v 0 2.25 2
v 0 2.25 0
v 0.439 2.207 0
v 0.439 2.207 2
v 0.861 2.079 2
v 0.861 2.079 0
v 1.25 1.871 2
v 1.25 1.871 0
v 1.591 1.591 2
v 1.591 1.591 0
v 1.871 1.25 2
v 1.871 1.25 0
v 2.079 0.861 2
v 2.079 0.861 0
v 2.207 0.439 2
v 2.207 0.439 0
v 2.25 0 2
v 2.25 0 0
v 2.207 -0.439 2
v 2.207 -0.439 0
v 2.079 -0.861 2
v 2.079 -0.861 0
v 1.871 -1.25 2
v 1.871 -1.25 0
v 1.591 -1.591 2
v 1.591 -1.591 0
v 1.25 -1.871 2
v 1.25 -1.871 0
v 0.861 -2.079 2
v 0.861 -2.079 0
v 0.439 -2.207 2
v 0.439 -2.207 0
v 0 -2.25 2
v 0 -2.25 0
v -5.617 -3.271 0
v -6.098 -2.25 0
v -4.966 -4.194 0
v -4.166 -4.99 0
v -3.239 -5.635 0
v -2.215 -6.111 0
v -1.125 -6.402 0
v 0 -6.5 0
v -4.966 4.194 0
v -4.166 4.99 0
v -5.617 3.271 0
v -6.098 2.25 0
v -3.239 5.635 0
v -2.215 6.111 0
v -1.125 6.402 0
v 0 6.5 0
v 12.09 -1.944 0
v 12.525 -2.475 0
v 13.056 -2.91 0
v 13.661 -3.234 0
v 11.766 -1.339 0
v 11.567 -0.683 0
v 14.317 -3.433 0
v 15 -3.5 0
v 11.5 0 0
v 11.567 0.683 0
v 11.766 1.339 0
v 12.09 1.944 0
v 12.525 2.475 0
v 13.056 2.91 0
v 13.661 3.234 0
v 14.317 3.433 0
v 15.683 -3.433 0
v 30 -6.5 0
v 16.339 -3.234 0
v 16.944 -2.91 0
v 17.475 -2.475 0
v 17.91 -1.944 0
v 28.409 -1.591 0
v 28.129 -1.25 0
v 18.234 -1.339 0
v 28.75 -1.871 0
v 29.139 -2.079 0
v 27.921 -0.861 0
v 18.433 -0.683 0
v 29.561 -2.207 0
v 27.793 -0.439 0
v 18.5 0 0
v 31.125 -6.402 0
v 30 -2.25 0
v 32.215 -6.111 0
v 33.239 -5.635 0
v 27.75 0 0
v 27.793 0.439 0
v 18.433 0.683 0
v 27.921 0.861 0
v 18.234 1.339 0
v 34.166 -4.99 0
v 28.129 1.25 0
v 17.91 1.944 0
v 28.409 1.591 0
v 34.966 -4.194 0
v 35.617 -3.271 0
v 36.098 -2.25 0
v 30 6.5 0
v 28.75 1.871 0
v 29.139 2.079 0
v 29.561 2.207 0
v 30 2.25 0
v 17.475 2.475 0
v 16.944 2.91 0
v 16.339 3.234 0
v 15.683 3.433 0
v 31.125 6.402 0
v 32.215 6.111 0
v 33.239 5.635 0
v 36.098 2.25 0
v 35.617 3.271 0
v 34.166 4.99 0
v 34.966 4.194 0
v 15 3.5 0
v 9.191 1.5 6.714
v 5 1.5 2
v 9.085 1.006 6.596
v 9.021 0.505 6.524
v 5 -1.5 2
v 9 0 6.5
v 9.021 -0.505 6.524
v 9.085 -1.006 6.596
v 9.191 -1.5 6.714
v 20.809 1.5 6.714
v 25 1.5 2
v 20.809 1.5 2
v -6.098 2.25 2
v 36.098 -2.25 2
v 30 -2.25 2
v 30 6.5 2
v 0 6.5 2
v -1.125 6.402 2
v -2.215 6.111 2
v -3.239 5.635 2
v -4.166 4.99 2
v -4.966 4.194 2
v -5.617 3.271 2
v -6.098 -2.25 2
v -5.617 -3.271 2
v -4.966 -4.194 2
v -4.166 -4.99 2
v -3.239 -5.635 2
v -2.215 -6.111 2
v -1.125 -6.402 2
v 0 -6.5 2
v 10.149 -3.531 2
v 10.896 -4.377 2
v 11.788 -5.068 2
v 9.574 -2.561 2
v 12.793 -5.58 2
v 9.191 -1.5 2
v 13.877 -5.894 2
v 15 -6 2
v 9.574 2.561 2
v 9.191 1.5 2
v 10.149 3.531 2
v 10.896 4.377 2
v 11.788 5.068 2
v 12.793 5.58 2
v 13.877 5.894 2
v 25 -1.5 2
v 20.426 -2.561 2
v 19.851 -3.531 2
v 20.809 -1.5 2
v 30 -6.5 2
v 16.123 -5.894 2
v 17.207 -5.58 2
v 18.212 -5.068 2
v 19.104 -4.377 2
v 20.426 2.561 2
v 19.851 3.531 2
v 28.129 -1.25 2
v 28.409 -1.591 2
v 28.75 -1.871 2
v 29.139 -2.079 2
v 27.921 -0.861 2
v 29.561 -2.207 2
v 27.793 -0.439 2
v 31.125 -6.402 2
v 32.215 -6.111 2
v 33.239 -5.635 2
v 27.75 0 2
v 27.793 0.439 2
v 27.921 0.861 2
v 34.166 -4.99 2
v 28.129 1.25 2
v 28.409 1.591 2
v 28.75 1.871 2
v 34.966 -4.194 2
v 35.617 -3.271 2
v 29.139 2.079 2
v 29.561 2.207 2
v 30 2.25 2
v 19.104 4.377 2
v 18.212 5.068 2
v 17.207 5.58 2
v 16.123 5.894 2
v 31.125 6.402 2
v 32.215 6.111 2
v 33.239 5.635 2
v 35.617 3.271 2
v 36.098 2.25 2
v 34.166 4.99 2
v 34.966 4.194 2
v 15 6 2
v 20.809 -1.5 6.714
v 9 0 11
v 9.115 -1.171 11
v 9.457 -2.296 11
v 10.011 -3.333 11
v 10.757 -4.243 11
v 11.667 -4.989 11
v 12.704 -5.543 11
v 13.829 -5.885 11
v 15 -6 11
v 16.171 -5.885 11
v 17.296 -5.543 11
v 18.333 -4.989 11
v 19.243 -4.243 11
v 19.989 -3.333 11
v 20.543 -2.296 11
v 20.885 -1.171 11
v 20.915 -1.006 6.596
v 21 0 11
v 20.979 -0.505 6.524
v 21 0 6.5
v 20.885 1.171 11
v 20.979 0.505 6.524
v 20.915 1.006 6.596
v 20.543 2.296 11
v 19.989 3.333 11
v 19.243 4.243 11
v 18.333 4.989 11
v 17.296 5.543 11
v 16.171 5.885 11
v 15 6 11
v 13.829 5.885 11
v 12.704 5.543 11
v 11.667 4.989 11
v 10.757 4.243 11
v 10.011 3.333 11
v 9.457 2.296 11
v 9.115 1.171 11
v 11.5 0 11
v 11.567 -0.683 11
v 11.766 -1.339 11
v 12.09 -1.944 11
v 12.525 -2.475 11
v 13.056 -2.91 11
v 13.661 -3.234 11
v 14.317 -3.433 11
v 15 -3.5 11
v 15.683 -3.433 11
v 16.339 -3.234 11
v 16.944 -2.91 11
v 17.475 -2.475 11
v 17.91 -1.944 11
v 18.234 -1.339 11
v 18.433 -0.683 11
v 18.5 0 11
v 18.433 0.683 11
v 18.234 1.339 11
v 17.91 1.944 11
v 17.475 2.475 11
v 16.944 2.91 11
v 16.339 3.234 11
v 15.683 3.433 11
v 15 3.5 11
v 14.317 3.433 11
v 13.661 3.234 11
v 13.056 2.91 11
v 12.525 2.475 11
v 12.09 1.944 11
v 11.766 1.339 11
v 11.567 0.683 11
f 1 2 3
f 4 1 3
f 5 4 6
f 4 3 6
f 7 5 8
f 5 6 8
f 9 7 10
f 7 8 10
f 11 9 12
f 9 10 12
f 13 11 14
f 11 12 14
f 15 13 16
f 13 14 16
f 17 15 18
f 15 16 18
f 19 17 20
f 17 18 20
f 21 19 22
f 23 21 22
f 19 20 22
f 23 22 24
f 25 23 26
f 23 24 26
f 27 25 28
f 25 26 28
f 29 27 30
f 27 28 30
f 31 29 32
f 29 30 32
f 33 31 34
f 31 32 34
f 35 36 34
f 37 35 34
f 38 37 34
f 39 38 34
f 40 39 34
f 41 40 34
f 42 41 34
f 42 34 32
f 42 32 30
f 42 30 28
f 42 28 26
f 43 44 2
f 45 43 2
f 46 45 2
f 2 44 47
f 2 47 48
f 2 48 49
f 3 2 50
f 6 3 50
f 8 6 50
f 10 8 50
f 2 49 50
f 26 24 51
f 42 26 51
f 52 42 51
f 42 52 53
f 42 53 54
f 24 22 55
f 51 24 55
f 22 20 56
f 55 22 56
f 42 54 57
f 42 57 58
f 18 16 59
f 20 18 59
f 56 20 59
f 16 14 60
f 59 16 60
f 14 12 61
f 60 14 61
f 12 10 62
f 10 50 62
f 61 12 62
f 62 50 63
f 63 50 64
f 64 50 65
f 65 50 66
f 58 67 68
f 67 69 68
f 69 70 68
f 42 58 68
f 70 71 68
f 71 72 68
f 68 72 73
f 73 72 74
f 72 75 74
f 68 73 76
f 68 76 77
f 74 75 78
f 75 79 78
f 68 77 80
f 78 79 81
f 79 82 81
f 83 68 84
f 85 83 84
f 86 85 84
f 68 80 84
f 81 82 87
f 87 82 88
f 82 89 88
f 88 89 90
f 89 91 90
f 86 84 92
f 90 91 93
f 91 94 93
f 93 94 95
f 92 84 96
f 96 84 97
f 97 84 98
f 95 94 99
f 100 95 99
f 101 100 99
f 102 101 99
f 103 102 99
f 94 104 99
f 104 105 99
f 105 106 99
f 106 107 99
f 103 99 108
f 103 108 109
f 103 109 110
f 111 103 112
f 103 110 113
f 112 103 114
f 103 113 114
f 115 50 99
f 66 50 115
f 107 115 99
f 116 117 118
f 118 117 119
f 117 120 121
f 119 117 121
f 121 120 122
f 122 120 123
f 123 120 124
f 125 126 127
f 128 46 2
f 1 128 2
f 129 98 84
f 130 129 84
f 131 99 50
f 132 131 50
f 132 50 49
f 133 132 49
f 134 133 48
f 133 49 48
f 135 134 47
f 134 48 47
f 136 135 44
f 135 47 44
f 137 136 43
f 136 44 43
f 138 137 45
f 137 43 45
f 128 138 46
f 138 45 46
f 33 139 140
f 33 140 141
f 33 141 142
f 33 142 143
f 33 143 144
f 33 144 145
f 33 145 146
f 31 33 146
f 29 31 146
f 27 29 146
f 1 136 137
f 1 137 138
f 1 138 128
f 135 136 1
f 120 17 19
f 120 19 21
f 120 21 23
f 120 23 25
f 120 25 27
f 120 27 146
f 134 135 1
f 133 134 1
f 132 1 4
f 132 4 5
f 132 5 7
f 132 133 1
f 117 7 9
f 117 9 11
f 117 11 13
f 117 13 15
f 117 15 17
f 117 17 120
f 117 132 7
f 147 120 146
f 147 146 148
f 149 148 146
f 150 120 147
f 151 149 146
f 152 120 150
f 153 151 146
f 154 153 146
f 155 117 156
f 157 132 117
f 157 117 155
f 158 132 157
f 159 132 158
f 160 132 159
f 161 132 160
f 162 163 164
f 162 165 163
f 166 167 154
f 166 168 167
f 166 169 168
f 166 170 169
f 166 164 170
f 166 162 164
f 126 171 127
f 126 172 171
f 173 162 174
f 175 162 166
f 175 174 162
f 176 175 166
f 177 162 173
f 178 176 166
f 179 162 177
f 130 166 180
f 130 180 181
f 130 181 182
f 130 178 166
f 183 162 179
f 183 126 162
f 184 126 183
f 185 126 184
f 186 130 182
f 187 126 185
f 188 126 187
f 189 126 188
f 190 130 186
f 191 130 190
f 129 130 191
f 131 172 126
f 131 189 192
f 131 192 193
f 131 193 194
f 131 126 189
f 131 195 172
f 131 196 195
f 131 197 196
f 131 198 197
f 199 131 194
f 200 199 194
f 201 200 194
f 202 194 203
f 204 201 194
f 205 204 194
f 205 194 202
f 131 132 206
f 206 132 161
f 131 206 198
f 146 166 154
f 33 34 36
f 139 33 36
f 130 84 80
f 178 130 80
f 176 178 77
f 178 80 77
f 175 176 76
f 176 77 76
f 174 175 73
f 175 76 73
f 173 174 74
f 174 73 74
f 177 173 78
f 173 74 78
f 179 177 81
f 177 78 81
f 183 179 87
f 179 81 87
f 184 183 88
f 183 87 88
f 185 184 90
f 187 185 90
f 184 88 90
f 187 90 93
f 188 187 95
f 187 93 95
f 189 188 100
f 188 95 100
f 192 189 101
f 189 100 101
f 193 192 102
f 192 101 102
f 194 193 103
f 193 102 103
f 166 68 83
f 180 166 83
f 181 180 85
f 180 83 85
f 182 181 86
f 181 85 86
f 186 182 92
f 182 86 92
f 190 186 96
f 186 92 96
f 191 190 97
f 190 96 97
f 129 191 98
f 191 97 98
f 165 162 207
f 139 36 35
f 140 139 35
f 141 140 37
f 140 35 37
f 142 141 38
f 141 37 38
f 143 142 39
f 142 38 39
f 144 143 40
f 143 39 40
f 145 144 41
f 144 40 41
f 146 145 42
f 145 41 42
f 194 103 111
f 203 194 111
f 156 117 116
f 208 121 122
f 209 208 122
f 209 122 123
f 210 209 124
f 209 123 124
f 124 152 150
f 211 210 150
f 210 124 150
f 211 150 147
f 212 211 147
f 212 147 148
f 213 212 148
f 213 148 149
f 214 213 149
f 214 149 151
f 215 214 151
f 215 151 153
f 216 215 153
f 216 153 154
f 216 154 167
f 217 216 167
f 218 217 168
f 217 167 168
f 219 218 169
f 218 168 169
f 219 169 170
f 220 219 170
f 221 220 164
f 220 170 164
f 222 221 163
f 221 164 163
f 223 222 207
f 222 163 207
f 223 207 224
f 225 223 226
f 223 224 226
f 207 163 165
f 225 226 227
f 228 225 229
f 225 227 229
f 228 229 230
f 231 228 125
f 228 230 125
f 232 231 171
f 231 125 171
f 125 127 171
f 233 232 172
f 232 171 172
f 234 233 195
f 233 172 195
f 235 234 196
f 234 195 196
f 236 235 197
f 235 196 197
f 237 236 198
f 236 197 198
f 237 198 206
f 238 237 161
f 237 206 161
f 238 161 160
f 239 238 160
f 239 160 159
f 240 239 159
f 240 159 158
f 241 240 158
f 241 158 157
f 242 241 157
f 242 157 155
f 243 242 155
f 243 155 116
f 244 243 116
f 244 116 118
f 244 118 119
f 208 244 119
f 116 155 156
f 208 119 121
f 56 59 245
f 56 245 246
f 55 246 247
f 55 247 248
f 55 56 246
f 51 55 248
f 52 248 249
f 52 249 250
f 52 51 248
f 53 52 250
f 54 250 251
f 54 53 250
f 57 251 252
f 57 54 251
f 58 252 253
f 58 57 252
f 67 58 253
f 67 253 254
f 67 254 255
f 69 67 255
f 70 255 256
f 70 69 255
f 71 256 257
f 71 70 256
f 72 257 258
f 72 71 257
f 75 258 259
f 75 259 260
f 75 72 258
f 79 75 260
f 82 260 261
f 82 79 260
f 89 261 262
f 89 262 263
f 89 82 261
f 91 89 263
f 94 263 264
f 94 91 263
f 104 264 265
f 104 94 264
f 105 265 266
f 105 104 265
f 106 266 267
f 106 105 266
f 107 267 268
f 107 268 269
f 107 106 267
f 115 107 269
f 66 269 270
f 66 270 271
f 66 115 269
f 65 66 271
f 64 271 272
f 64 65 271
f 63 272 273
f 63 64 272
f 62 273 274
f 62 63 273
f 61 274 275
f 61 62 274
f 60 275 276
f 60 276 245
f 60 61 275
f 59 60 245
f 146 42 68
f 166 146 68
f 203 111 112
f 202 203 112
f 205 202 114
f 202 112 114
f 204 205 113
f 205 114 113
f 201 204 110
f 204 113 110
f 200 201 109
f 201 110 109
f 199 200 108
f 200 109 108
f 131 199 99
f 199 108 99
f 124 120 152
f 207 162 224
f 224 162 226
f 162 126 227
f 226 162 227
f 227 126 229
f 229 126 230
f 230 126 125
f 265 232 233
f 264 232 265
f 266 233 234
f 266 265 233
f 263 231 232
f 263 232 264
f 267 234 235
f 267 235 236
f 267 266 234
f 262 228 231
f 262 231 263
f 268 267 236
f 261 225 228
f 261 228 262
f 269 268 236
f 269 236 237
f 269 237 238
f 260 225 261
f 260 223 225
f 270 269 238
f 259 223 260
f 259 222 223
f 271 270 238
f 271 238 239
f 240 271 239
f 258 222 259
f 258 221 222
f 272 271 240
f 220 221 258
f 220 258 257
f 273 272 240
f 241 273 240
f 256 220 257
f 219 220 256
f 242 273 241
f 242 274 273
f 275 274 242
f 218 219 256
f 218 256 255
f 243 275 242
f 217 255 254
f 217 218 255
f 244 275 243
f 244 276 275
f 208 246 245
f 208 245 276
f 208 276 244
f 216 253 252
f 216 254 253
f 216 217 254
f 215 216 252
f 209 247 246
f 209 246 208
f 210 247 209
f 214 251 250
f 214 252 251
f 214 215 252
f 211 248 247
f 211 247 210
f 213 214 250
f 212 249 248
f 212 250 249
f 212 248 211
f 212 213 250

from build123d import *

# Parameters (mm, degrees)
SKETCH_1_R               = 6
EXTRUDE_1_DEPTH          = 2
SKETCH_1_3_R             = 6
SKETCH_1_3_R_2           = 3.5
EXTRUDE_2_DEPTH          = 11
RIB_1_REACH              = 40.293
SKETCH_2_WALL_W          = 84.606091636
SKETCH_2_WALL_H          = 3
PATTERN_CIRCULAR_1_COUNT = 2


with BuildPart() as part:
    # Эскиз1 → Бобышка-Вытянуть1 (new body)
    with BuildSketch(Plane.XY):
        with BuildLine():
            Line((30, 6.5), (0, 6.5))
            ThreePointArc((0, 6.5), (-3.716517187, 5.332682252), (-6.098155459, 2.25))
            Line((-6.098155459, 2.25), (0, 2.25))
            ThreePointArc((0, 2.25), (2.25, 0), (0, -2.25))
            Line((0, -2.25), (-6.098155459, -2.25))
            ThreePointArc((-6.098155459, -2.25), (-3.716517187, -5.332682252), (0, -6.5))
            Line((0, -6.5), (30, -6.5))
            ThreePointArc((30, -6.5), (33.716517187, -5.332682252), (36.098155459, -2.25))
            Line((36.098155459, -2.25), (30, -2.25))
            ThreePointArc((30, -2.25), (27.75, 0), (30, 2.25))
            Line((30, 2.25), (36.098155459, 2.25))
            ThreePointArc((36.098155459, 2.25), (33.716517187, 5.332682252), (30, 6.5))
        make_face()
        with Locations((15, 0)):
            Circle(SKETCH_1_R, mode=Mode.SUBTRACT)
    extrude(amount=EXTRUDE_1_DEPTH)

    # Эскиз1<3> → Бобышка-Вытянуть2 (add)
    with BuildSketch(Plane.XY):
        with Locations((15, 0)):
            Circle(SKETCH_1_3_R)
        with Locations((15, 0)):
            Circle(SKETCH_1_3_R_2, mode=Mode.SUBTRACT)
    extrude(amount=EXTRUDE_2_DEPTH)

    # Эскиз2 wall → Ребро1 (add, up to next)
    with BuildSketch(Plane(origin=(7, 0, 4.25), x_dir=(0.66436383883, 0, 0.747409318684), z_dir=(0.747409318684, 0, -0.66436383883)), mode=Mode.PRIVATE) as rib_1_sk1:
        Rectangle(SKETCH_2_WALL_W, SKETCH_2_WALL_H)
    rib_1_tool1 = extrude(rib_1_sk1.sketch, amount=RIB_1_REACH, mode=Mode.PRIVATE) - part.part
    rib_1 = rib_1_tool1.solids().sort_by_distance((7, 0, 4.25))[0]
    add(rib_1)

    # Круговой массив1: Ребро1 ×2 about axis
    pattern_circular_1_axis = Axis((15, 0, 11), (0, 0, -1))
    for i in range(1, PATTERN_CIRCULAR_1_COUNT):
        add(rib_1.rotate(pattern_circular_1_axis, i * 360 / PATTERN_CIRCULAR_1_COUNT))


solid = part.part
